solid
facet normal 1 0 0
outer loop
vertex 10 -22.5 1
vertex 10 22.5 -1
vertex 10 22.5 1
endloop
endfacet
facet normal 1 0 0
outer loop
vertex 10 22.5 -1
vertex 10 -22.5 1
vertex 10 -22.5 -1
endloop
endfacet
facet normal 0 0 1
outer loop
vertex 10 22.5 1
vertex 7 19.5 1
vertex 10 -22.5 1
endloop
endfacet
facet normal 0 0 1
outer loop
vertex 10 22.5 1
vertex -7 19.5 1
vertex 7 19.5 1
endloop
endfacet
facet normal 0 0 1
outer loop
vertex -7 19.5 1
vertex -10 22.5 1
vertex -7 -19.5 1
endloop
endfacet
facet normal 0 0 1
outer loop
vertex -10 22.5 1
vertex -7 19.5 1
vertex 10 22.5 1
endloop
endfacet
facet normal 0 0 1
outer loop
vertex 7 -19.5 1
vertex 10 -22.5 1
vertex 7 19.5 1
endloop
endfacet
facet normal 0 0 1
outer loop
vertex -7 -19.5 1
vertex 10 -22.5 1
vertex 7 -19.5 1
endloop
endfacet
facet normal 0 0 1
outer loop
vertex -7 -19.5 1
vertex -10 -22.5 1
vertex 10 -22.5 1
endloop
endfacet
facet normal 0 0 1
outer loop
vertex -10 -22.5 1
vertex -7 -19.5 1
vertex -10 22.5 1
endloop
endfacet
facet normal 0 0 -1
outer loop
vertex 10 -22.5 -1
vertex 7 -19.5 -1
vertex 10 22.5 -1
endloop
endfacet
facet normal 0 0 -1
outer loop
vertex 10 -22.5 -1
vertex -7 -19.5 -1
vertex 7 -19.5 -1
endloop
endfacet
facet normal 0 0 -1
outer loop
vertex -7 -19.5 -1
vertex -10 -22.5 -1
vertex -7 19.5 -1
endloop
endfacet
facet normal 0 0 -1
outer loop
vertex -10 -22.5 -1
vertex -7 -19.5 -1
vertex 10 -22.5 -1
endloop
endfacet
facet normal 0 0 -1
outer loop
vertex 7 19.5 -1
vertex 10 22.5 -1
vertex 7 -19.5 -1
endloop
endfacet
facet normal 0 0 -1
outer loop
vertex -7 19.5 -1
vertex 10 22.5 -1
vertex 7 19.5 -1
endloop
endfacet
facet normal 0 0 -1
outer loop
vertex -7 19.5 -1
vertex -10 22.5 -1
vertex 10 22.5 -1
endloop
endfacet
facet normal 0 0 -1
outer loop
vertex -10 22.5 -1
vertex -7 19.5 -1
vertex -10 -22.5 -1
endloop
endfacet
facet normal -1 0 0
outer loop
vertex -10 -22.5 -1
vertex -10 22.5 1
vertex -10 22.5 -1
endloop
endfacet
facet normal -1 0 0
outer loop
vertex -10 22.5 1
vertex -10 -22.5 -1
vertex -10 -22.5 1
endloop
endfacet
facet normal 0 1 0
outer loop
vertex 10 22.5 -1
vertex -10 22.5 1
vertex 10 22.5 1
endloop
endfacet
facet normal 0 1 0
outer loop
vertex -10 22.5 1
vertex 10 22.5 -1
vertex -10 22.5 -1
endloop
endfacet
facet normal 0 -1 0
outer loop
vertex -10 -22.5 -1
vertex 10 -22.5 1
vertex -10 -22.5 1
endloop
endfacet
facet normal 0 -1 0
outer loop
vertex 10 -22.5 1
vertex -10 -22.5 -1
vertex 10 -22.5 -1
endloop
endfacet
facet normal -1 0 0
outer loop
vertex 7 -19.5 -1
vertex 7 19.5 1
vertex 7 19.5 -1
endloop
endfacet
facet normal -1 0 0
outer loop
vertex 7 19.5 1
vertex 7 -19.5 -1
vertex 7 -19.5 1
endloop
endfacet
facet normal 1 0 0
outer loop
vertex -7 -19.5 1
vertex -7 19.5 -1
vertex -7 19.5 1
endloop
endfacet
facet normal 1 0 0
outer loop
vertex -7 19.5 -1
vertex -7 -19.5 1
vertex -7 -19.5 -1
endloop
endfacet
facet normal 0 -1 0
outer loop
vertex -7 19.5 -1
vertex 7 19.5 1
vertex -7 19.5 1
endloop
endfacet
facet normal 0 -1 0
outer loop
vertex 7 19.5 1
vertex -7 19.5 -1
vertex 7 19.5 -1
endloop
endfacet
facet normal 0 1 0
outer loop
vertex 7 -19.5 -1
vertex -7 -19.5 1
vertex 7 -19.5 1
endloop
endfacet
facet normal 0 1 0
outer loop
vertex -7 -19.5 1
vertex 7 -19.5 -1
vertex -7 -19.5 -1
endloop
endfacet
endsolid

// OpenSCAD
w_back = 70;
h_back = 45;
w_controller = 20;
thickness_bottom = 2;
width_frame_window = 3;
thickness_top = 2;

h_wall = 4;
thickness_walls = 2;
gap_backlight = 1.5;



//kit_controller();
//walls();
//debug_controller();
frame_controller();



module frame_controller(){
    difference(){
        cube([w_controller,h_back,thickness_top],center=true);
        color("red")
        cube([w_controller-2*width_frame_window, h_back-2*width_frame_window,thickness_top+1],center=true);
    }
}
module debug_controller(){
    difference(){
        kit_controller();
        translate([-w_controller/2, 0, h_wall/2])
        cube([w_controller, h_back+2*thickness_walls+1+gap_backlight, 2*h_wall], center = true);
    }
}

module kit_controller(){
    controller();
    translate([0, 0, h_wall/2])
    walls();
    color("green")
    translate([0, 0, thickness_bottom+0.1])
    frame_controller();
}

module walls() {
difference() {
    cube([w_controller + 2*thickness_walls+gap_backlight, h_back + 2*thickness_walls+gap_backlight, thickness_bottom + h_wall], center=true);
    color("red")
    cube([w_controller+gap_backlight, h_back+gap_backlight, thickness_bottom + h_wall + 1], center=true);
    translate([-w_controller-thickness_walls+gap_backlight/2-0.24, 0, 0])
    cube([w_controller+gap_backlight, h_back+gap_backlight+2*thickness_walls+1, thickness_bottom+h_wall+1], center=true);
 }
}

module controller() {
    cube([w_controller+gap_backlight, h_back+gap_backlight, thickness_bottom], center=true);
}
